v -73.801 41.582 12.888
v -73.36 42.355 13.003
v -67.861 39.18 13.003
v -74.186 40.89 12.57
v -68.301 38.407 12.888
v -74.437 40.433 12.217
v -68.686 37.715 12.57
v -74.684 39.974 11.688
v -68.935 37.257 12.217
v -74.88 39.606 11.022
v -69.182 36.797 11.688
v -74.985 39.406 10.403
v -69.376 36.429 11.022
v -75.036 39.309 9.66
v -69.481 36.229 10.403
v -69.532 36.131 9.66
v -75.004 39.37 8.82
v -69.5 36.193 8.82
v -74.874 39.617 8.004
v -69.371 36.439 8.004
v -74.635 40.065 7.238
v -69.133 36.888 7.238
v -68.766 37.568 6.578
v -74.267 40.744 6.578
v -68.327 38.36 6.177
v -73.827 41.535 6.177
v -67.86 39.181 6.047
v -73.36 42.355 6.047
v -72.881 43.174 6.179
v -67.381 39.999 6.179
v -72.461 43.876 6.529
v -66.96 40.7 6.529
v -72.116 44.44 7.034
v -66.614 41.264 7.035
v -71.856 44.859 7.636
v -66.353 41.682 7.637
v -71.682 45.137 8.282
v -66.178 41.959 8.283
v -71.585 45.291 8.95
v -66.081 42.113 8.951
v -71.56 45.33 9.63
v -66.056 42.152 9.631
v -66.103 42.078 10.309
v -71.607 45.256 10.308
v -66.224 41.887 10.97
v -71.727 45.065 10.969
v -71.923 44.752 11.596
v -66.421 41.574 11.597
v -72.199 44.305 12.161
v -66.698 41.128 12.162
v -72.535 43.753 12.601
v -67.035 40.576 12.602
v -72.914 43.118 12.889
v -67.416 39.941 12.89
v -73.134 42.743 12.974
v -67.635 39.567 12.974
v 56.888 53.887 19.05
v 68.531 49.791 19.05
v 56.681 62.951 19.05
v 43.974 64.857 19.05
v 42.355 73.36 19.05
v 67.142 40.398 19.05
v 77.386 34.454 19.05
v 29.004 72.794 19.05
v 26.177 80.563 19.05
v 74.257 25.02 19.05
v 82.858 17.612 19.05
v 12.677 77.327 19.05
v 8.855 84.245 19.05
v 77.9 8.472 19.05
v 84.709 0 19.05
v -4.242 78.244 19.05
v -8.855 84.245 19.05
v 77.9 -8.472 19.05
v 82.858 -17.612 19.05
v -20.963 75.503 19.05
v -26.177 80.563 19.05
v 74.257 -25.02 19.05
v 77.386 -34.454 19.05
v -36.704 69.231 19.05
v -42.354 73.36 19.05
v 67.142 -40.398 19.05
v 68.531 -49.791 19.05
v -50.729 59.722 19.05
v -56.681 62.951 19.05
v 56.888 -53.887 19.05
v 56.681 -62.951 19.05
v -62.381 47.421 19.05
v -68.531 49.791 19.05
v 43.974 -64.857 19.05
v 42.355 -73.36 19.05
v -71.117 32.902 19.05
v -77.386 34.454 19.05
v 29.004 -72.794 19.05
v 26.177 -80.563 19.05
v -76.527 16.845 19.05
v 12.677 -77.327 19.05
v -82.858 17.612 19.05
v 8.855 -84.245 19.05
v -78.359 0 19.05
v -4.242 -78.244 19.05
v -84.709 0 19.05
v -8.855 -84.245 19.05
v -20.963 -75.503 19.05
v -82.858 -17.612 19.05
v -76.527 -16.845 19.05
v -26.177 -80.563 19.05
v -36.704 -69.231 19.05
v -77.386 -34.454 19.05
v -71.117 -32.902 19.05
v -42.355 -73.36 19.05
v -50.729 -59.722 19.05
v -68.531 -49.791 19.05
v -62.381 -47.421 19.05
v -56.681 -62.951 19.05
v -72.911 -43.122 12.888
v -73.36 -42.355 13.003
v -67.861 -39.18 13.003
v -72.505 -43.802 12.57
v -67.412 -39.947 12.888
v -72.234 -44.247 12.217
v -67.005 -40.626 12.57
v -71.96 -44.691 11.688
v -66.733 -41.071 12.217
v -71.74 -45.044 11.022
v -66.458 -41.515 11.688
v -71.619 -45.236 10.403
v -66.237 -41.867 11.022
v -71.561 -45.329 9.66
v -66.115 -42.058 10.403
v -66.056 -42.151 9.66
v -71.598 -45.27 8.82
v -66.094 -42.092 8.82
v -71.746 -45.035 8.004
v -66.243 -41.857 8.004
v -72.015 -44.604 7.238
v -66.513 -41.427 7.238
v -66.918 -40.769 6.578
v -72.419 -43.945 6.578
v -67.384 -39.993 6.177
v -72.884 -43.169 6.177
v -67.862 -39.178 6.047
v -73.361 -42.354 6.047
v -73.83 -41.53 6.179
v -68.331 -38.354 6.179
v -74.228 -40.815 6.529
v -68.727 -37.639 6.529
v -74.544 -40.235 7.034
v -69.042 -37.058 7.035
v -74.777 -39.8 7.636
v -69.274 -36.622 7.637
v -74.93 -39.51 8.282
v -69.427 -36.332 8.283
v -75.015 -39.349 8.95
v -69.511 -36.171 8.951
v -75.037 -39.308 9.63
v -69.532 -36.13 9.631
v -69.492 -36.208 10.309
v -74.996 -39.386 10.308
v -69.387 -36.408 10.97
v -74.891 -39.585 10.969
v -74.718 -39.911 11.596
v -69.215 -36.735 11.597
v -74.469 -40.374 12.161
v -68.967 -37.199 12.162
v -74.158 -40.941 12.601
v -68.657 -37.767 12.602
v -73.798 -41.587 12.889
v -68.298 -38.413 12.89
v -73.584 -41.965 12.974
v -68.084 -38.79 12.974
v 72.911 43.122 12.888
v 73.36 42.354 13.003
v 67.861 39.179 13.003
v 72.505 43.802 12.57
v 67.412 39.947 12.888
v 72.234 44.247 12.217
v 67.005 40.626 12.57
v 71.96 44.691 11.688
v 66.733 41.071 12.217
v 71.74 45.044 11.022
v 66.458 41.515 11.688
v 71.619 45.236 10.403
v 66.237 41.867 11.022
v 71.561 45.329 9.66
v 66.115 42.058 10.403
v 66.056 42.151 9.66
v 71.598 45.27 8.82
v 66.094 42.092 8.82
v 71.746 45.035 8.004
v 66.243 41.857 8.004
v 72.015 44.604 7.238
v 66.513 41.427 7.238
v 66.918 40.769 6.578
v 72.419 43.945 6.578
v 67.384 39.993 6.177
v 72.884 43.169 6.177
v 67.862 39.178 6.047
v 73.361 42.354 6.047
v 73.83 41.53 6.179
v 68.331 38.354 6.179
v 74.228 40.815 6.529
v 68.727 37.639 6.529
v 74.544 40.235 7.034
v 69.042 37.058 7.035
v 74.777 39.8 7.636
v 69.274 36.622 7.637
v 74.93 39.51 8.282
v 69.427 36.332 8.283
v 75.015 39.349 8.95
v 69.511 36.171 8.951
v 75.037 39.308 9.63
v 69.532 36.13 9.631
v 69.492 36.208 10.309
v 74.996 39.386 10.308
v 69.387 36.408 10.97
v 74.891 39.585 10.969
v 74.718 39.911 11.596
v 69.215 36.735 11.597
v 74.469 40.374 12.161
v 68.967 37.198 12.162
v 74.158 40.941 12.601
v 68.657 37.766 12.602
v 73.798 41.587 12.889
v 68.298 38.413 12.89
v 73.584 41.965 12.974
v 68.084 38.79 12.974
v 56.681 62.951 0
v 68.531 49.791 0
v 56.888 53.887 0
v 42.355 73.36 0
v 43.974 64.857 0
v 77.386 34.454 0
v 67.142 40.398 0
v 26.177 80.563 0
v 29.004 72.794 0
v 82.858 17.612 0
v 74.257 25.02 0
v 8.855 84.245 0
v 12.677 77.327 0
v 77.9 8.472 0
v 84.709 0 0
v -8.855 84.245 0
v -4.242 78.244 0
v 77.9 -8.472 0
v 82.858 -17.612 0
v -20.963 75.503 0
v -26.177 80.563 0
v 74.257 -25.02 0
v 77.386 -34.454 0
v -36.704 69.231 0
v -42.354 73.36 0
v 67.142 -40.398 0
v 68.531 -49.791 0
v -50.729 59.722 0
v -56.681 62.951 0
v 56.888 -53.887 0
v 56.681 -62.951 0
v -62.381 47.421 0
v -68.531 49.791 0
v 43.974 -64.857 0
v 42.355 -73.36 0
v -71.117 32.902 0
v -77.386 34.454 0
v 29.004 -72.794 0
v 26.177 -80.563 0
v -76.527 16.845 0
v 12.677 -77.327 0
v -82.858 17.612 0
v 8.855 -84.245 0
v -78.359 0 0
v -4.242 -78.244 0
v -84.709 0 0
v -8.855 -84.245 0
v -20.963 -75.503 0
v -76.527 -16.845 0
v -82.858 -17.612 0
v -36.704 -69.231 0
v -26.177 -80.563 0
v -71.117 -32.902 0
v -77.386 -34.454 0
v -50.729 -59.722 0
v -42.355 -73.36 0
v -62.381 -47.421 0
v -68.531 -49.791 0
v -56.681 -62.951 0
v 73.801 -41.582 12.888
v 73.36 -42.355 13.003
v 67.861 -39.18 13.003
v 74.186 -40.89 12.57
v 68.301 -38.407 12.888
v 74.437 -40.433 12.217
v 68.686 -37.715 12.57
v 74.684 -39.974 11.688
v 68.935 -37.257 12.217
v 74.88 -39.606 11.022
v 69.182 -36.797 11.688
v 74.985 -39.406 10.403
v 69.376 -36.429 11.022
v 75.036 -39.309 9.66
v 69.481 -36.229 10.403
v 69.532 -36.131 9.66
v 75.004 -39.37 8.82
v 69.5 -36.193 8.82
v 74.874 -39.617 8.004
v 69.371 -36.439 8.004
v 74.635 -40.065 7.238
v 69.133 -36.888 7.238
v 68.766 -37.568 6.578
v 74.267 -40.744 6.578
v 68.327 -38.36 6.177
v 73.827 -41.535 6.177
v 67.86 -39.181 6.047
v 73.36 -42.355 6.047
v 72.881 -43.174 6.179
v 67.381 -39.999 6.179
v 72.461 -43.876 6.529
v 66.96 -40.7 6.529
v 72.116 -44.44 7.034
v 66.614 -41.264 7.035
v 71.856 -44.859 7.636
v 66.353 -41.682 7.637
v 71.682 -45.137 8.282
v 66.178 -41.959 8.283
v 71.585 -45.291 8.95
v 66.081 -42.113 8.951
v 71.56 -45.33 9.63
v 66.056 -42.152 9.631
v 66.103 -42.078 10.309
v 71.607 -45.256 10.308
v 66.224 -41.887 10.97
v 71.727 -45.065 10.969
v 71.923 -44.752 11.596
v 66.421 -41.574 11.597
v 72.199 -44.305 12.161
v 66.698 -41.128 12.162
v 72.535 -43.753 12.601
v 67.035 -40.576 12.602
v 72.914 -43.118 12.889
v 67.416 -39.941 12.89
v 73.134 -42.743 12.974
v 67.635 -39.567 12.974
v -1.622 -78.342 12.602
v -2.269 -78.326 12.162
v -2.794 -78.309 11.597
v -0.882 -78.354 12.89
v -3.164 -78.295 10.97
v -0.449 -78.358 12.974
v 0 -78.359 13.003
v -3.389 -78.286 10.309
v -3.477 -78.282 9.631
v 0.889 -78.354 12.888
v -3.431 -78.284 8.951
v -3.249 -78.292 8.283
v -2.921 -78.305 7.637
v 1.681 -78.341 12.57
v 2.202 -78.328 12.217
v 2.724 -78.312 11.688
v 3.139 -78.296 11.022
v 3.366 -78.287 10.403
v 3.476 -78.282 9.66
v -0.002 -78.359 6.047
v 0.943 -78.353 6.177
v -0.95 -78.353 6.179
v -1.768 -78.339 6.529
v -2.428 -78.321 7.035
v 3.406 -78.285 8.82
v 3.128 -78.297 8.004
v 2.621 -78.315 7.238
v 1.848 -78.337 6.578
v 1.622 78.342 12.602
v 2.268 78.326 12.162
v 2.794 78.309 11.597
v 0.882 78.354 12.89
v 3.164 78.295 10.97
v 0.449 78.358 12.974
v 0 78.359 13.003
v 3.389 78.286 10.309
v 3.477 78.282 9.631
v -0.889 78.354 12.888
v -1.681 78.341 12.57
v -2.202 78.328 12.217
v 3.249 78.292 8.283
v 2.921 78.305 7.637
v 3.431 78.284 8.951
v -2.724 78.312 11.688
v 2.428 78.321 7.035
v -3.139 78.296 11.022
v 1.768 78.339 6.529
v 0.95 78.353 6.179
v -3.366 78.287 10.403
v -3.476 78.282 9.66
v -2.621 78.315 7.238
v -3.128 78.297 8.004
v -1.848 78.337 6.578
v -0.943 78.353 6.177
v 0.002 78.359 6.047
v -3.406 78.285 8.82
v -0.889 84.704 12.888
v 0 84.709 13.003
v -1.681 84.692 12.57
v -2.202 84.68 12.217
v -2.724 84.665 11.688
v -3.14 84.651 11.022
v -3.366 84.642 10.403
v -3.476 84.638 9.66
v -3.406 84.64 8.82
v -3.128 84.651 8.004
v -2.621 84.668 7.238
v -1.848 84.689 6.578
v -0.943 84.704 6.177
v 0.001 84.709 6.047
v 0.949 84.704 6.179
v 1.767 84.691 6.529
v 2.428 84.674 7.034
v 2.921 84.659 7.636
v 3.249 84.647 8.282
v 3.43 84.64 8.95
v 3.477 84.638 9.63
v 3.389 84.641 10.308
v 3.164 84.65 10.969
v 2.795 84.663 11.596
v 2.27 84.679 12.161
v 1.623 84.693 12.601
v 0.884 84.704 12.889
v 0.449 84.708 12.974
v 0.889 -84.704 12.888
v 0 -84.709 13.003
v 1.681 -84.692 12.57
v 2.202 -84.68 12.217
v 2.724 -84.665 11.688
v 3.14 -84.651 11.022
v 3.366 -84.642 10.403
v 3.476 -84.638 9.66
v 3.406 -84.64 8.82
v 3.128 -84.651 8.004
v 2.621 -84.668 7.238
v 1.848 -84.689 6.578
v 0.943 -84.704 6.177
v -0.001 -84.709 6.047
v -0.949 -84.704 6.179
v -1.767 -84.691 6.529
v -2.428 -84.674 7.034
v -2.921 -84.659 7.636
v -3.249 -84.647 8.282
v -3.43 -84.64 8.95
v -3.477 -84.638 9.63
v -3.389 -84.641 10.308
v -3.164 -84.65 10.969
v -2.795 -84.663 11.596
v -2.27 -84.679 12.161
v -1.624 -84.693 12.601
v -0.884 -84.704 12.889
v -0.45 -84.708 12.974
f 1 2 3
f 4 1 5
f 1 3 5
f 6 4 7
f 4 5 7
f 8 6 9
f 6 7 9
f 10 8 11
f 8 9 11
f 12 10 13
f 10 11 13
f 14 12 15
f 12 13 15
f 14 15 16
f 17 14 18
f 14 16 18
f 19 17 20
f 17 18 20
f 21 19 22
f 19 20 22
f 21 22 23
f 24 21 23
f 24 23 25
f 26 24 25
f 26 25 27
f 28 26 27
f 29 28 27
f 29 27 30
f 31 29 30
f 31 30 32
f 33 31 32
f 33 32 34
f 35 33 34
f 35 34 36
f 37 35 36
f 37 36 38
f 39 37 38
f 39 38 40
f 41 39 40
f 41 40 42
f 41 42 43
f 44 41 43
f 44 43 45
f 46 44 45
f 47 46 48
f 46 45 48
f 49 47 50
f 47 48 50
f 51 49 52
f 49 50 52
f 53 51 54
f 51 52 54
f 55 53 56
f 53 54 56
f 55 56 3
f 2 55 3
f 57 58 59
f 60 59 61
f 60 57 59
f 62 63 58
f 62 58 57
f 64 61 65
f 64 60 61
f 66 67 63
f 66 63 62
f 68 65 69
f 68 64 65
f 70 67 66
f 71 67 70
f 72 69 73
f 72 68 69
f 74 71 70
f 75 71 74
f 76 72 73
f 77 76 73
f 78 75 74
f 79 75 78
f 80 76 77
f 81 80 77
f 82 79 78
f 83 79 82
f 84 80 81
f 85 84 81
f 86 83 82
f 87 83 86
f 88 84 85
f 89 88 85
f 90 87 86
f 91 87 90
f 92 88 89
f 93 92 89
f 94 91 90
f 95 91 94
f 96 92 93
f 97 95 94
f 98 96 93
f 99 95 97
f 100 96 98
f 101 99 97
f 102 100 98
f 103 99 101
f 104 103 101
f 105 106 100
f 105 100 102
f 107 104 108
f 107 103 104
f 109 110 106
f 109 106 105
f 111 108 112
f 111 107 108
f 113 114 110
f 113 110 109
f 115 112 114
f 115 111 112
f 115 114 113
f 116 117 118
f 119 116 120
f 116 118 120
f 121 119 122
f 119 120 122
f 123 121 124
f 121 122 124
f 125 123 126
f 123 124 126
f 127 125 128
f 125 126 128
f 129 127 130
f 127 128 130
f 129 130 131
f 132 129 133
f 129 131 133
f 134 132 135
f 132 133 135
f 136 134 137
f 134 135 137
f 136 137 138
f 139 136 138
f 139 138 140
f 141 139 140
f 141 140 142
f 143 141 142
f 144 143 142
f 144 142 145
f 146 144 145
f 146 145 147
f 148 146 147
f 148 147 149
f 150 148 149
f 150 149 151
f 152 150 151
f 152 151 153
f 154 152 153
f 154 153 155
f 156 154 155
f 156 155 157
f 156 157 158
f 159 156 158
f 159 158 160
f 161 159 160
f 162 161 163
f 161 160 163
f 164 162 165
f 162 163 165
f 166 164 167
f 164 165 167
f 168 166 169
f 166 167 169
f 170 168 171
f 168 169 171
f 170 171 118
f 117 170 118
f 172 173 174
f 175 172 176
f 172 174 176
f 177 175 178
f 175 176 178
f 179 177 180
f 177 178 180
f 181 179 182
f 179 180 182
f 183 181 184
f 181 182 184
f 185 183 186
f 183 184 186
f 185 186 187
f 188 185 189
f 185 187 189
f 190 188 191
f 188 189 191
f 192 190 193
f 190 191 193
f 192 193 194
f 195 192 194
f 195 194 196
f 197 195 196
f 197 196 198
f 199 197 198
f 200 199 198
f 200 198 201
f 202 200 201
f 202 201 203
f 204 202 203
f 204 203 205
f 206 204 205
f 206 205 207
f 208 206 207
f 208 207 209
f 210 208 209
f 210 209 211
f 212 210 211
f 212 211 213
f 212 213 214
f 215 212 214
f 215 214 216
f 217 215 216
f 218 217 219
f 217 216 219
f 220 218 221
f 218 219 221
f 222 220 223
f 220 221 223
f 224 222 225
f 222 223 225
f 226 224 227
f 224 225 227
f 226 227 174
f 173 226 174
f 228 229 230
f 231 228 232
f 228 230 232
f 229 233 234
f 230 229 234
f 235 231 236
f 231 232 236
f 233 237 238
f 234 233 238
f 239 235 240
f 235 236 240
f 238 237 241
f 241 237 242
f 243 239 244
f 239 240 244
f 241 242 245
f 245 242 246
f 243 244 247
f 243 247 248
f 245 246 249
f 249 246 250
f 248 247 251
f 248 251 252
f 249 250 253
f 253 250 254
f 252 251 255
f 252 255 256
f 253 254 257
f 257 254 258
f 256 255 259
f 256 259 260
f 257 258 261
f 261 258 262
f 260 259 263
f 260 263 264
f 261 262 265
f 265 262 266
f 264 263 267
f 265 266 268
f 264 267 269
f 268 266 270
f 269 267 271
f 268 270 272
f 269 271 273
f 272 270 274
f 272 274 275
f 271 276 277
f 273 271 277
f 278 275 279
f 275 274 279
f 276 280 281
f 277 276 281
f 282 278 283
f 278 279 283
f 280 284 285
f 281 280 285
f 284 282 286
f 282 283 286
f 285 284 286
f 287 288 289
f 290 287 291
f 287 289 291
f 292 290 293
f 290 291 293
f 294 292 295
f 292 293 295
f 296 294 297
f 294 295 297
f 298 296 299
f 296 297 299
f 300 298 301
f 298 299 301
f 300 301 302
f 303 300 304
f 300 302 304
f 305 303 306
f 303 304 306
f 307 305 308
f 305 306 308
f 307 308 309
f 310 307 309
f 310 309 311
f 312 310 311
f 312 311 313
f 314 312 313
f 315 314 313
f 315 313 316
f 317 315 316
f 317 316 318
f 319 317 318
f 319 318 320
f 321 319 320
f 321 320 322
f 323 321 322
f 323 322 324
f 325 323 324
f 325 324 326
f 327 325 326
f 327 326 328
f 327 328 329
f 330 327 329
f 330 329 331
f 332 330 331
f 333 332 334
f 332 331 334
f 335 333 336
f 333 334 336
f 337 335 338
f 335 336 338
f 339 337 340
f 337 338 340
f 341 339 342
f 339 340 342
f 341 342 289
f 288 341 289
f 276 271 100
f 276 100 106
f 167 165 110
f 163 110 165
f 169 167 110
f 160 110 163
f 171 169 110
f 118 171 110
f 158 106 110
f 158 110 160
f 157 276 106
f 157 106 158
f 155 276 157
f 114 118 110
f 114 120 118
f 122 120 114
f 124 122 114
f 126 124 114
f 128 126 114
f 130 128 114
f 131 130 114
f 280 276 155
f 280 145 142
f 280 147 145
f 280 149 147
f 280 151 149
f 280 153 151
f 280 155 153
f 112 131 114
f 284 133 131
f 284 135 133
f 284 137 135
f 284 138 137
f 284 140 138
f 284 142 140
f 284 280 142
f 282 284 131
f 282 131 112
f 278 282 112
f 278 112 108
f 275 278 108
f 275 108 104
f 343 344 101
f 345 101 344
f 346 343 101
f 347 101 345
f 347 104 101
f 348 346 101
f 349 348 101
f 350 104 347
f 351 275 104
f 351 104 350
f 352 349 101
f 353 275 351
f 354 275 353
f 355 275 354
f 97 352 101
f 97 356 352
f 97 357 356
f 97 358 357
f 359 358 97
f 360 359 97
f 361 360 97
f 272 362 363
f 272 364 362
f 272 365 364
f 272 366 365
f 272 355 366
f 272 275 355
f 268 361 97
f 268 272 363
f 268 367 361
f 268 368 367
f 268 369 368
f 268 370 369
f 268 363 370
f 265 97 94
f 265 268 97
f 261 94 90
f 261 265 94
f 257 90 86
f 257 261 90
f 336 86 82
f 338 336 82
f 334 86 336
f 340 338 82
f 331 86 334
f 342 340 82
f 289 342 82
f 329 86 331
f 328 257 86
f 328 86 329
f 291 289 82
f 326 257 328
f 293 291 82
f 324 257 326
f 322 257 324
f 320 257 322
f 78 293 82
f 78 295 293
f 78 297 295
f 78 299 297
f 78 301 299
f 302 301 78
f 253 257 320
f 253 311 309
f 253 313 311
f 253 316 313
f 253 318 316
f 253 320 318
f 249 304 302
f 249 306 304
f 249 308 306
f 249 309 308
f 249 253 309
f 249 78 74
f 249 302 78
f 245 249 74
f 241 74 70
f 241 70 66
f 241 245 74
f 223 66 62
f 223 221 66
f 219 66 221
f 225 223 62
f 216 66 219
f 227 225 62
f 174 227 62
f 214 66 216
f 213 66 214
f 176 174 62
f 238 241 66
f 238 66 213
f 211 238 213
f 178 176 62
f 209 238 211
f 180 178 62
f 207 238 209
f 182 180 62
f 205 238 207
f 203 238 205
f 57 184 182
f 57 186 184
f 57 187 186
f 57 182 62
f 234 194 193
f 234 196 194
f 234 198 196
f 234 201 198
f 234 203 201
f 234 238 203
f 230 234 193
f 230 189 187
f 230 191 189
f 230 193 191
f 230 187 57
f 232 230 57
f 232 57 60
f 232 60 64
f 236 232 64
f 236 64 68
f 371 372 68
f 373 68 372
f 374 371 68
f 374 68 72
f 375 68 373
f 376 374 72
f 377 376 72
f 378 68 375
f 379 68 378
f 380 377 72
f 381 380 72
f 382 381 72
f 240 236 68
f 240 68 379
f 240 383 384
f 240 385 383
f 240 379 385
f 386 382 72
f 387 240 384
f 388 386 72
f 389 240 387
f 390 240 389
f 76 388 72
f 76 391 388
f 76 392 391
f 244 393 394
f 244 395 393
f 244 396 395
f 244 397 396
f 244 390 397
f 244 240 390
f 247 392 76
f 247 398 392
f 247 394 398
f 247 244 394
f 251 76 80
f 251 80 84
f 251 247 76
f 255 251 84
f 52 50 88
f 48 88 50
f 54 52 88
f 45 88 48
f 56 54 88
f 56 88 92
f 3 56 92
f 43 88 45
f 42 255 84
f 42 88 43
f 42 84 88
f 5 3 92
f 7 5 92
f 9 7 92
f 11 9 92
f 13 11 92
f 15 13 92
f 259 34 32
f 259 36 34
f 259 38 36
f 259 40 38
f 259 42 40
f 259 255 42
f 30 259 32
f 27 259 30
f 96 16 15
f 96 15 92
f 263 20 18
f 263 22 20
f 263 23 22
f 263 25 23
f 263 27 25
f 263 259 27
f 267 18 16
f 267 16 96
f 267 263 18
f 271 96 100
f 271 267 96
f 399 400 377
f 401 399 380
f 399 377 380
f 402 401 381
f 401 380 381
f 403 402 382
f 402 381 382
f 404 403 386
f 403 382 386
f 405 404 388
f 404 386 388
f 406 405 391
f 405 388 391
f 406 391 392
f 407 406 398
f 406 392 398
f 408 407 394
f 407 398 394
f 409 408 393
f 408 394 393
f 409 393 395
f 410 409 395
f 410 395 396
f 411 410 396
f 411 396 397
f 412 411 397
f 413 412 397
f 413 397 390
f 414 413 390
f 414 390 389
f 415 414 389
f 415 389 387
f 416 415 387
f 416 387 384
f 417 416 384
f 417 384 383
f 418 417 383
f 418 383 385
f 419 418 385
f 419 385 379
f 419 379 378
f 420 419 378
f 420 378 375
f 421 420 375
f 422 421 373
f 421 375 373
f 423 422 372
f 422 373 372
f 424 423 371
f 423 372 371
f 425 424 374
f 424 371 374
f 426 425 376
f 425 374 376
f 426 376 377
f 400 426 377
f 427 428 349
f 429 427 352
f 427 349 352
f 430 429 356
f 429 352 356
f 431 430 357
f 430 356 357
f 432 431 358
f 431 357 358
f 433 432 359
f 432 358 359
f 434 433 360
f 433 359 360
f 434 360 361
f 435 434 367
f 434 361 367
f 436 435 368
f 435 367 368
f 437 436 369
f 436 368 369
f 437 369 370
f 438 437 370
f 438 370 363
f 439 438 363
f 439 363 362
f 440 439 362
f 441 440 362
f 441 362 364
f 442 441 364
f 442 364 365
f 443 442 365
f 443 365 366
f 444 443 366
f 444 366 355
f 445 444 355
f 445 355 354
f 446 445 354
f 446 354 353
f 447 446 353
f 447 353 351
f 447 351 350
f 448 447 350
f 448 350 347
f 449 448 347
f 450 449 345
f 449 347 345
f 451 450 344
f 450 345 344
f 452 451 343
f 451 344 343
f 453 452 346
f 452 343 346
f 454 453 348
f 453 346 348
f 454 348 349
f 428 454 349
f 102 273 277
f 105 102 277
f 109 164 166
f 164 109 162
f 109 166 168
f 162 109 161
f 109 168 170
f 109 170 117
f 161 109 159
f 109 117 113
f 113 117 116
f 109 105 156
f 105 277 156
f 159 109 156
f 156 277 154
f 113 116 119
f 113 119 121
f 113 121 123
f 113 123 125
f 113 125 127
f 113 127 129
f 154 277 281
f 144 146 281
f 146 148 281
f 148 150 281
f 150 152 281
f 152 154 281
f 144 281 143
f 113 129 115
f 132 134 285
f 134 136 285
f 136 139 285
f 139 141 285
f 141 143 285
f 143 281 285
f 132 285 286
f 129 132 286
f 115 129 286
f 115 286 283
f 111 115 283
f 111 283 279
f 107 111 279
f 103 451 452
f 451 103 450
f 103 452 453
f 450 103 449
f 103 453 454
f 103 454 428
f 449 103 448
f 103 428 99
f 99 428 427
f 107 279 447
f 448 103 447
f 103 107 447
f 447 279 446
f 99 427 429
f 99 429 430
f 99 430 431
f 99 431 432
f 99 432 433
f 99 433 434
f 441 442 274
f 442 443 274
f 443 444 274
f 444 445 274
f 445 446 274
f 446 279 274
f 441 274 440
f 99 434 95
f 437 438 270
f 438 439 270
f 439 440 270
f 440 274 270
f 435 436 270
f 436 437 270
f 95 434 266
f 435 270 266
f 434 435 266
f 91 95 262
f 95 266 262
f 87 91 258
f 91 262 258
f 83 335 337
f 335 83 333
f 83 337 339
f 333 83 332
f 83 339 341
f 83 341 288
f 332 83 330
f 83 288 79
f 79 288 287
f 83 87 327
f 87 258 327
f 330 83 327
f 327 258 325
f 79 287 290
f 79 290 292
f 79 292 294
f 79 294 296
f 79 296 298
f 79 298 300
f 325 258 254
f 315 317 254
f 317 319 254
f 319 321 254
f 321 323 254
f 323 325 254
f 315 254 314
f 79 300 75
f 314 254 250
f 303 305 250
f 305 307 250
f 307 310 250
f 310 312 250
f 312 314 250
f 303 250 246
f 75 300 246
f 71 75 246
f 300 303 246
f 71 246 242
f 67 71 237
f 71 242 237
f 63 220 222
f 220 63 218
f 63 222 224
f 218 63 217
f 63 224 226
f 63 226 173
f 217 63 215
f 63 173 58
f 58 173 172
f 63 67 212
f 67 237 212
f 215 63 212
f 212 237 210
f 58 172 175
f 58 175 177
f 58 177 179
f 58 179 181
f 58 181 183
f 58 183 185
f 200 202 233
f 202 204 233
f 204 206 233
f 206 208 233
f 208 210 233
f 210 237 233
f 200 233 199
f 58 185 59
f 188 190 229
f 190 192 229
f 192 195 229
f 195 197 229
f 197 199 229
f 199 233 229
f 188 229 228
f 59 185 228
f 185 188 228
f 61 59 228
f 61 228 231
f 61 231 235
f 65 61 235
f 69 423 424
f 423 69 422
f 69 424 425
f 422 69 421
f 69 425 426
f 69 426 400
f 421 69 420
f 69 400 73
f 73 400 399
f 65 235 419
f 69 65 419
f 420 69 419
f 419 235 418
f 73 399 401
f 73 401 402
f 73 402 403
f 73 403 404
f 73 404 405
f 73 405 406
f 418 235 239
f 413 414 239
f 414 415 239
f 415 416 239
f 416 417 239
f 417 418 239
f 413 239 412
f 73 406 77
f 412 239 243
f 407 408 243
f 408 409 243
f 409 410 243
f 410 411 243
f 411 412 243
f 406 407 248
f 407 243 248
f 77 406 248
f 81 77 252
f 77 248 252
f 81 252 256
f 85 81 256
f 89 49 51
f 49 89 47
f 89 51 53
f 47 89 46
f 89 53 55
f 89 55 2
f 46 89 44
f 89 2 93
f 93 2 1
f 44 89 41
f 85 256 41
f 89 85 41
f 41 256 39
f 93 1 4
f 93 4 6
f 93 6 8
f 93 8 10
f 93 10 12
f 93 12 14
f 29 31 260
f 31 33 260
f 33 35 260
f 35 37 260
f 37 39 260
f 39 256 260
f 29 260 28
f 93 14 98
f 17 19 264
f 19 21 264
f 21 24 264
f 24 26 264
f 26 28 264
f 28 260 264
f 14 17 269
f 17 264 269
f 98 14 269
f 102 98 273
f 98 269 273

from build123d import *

# Parameters (mm, degrees)
SKETCH1_R           = 84.709
SKETCH1_R_2         = 78.359
BOSS_EXTRUDE1_DEPTH = 19.05
SKETCH2_R           = 3.478244762
CUT_EXTRUDE1_DEPTH  = 122.301821347
CIRPATTERN1_COUNT   = 6


with BuildPart() as part:
    # Sketch1 → Boss-Extrude1 (new body)
    with BuildSketch(Plane.XY):
        with Locations(Location((0, 0, 0), (0, 0, 180))):
            Circle(SKETCH1_R)
        with Locations(Location((0, 0, 0), (0, 0, 180))):
            Circle(SKETCH1_R_2, mode=Mode.SUBTRACT)
    extrude(amount=BOSS_EXTRUDE1_DEPTH)

    # Sketch2 → Cut-Extrude1 (cut, through all)
    with BuildSketch(Plane(origin=(0, 0, 0), x_dir=(1, 0, 0), z_dir=(0, 1, 0))):
        with Locations(Location((0, -9.525, 0), (0, 0, 270))):
            Circle(SKETCH2_R)
    cut_extrude1 = extrude(amount=-CUT_EXTRUDE1_DEPTH, mode=Mode.SUBTRACT)

    # CirPattern1: Cut-Extrude1 ×6 about axis
    cirpattern1_axis = Axis((0, 0, 2.080715754), (0, 0, 1))
    for i in range(1, CIRPATTERN1_COUNT):
        add(cut_extrude1.rotate(cirpattern1_axis, i * 360 / CIRPATTERN1_COUNT), mode=Mode.SUBTRACT)


solid = part.part
